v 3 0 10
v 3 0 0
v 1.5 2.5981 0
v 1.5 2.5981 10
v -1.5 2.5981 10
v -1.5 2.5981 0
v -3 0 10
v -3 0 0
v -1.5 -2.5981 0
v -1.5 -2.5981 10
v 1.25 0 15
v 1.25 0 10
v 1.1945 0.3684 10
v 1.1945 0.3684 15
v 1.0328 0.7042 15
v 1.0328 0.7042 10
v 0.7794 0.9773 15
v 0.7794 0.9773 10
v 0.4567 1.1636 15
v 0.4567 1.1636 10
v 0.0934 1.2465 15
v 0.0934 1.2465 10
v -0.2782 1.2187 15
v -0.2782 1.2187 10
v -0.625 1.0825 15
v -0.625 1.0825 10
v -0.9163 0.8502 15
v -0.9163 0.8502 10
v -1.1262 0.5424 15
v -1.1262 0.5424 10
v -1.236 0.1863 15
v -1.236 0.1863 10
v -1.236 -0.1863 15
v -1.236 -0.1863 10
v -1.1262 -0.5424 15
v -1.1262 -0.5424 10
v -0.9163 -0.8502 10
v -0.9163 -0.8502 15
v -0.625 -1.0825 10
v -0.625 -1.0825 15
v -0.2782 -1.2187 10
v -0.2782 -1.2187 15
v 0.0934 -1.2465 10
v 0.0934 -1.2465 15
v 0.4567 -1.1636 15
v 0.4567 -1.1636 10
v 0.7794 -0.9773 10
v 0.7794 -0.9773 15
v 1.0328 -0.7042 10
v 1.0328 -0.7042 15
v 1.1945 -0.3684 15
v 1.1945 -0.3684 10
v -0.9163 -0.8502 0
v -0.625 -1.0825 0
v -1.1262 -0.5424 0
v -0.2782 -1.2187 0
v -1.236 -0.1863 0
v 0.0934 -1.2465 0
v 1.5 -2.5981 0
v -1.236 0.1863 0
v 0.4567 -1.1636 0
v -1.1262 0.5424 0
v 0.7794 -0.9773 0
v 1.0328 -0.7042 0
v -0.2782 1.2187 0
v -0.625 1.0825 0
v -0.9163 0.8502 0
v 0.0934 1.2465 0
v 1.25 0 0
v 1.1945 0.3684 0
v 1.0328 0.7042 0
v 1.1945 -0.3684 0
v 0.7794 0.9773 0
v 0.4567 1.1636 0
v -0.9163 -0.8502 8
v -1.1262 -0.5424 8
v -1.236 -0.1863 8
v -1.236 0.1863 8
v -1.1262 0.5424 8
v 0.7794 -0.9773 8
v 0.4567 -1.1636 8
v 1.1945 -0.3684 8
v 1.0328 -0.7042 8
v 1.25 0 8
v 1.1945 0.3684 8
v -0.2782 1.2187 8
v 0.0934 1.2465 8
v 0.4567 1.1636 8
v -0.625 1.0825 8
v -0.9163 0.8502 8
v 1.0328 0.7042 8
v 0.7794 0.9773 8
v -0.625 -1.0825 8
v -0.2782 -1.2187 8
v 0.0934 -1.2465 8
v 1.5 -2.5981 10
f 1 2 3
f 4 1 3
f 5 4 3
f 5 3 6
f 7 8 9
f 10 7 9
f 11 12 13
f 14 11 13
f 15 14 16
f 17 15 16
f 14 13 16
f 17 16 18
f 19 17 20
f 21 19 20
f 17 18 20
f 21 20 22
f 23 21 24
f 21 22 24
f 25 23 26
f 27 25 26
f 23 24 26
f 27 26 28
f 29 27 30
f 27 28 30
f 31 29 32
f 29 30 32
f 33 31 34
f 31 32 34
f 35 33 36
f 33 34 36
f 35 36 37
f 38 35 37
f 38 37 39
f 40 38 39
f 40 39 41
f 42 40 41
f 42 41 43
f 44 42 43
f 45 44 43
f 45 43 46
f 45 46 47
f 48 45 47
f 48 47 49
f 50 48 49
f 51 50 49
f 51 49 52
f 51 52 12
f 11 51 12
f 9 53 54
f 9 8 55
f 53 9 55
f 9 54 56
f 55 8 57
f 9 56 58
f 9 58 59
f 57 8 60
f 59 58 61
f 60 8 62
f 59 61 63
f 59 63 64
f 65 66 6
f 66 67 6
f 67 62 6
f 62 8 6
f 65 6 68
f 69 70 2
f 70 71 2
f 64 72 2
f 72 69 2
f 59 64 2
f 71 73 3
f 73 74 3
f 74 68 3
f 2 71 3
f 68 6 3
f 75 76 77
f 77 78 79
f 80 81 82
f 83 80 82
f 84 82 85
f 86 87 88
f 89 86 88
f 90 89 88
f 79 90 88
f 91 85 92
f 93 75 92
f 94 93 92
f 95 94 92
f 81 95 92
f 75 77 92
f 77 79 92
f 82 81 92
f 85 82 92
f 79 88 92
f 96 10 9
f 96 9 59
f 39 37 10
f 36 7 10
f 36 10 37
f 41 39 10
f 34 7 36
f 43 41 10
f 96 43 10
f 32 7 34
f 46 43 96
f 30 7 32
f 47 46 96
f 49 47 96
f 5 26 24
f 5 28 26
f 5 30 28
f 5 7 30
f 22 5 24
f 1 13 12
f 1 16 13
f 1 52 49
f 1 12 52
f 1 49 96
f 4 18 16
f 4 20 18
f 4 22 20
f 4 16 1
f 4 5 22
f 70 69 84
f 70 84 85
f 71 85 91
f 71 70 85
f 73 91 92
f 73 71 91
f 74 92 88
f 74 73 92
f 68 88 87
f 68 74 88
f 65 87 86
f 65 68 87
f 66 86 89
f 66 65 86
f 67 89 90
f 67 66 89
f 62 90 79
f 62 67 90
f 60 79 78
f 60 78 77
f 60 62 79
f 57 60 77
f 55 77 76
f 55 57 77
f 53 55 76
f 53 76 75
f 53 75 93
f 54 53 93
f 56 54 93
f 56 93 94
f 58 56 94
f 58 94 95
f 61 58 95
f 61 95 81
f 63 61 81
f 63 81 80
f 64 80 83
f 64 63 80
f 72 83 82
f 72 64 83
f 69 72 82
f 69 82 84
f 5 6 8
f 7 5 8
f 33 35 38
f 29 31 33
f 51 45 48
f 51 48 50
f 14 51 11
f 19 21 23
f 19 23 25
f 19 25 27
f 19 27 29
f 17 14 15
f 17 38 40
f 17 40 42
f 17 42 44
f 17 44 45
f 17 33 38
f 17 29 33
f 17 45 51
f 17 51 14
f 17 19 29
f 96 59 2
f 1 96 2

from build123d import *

# Parameters (mm, degrees)
F0_R     = 1.25
F1_DEPTH = 10
F2_DEPTH = 15
F3_DEPTH = 8


with BuildPart() as f1:
    # F0 (on Top) → F1 (new body)
    with BuildSketch(Plane.XY):
        Polygon((1.5, 2.598076), (-1.5, 2.598076), (-3, 0), (-1.5, -2.598076), (1.5, -2.598076), (3, 0), align=None)
        Circle(F0_R, mode=Mode.SUBTRACT)
    extrude(amount=F1_DEPTH)

    # F0 (on Top) → F2 (join)
    with BuildSketch(Plane.XY):
        Circle(F0_R)
    extrude(amount=F2_DEPTH)

    # F0 (on Top) → F3 (cut)
    with BuildSketch(Plane.XY):
        Circle(F0_R)
    extrude(amount=F3_DEPTH, mode=Mode.SUBTRACT)


solid = f1.part
